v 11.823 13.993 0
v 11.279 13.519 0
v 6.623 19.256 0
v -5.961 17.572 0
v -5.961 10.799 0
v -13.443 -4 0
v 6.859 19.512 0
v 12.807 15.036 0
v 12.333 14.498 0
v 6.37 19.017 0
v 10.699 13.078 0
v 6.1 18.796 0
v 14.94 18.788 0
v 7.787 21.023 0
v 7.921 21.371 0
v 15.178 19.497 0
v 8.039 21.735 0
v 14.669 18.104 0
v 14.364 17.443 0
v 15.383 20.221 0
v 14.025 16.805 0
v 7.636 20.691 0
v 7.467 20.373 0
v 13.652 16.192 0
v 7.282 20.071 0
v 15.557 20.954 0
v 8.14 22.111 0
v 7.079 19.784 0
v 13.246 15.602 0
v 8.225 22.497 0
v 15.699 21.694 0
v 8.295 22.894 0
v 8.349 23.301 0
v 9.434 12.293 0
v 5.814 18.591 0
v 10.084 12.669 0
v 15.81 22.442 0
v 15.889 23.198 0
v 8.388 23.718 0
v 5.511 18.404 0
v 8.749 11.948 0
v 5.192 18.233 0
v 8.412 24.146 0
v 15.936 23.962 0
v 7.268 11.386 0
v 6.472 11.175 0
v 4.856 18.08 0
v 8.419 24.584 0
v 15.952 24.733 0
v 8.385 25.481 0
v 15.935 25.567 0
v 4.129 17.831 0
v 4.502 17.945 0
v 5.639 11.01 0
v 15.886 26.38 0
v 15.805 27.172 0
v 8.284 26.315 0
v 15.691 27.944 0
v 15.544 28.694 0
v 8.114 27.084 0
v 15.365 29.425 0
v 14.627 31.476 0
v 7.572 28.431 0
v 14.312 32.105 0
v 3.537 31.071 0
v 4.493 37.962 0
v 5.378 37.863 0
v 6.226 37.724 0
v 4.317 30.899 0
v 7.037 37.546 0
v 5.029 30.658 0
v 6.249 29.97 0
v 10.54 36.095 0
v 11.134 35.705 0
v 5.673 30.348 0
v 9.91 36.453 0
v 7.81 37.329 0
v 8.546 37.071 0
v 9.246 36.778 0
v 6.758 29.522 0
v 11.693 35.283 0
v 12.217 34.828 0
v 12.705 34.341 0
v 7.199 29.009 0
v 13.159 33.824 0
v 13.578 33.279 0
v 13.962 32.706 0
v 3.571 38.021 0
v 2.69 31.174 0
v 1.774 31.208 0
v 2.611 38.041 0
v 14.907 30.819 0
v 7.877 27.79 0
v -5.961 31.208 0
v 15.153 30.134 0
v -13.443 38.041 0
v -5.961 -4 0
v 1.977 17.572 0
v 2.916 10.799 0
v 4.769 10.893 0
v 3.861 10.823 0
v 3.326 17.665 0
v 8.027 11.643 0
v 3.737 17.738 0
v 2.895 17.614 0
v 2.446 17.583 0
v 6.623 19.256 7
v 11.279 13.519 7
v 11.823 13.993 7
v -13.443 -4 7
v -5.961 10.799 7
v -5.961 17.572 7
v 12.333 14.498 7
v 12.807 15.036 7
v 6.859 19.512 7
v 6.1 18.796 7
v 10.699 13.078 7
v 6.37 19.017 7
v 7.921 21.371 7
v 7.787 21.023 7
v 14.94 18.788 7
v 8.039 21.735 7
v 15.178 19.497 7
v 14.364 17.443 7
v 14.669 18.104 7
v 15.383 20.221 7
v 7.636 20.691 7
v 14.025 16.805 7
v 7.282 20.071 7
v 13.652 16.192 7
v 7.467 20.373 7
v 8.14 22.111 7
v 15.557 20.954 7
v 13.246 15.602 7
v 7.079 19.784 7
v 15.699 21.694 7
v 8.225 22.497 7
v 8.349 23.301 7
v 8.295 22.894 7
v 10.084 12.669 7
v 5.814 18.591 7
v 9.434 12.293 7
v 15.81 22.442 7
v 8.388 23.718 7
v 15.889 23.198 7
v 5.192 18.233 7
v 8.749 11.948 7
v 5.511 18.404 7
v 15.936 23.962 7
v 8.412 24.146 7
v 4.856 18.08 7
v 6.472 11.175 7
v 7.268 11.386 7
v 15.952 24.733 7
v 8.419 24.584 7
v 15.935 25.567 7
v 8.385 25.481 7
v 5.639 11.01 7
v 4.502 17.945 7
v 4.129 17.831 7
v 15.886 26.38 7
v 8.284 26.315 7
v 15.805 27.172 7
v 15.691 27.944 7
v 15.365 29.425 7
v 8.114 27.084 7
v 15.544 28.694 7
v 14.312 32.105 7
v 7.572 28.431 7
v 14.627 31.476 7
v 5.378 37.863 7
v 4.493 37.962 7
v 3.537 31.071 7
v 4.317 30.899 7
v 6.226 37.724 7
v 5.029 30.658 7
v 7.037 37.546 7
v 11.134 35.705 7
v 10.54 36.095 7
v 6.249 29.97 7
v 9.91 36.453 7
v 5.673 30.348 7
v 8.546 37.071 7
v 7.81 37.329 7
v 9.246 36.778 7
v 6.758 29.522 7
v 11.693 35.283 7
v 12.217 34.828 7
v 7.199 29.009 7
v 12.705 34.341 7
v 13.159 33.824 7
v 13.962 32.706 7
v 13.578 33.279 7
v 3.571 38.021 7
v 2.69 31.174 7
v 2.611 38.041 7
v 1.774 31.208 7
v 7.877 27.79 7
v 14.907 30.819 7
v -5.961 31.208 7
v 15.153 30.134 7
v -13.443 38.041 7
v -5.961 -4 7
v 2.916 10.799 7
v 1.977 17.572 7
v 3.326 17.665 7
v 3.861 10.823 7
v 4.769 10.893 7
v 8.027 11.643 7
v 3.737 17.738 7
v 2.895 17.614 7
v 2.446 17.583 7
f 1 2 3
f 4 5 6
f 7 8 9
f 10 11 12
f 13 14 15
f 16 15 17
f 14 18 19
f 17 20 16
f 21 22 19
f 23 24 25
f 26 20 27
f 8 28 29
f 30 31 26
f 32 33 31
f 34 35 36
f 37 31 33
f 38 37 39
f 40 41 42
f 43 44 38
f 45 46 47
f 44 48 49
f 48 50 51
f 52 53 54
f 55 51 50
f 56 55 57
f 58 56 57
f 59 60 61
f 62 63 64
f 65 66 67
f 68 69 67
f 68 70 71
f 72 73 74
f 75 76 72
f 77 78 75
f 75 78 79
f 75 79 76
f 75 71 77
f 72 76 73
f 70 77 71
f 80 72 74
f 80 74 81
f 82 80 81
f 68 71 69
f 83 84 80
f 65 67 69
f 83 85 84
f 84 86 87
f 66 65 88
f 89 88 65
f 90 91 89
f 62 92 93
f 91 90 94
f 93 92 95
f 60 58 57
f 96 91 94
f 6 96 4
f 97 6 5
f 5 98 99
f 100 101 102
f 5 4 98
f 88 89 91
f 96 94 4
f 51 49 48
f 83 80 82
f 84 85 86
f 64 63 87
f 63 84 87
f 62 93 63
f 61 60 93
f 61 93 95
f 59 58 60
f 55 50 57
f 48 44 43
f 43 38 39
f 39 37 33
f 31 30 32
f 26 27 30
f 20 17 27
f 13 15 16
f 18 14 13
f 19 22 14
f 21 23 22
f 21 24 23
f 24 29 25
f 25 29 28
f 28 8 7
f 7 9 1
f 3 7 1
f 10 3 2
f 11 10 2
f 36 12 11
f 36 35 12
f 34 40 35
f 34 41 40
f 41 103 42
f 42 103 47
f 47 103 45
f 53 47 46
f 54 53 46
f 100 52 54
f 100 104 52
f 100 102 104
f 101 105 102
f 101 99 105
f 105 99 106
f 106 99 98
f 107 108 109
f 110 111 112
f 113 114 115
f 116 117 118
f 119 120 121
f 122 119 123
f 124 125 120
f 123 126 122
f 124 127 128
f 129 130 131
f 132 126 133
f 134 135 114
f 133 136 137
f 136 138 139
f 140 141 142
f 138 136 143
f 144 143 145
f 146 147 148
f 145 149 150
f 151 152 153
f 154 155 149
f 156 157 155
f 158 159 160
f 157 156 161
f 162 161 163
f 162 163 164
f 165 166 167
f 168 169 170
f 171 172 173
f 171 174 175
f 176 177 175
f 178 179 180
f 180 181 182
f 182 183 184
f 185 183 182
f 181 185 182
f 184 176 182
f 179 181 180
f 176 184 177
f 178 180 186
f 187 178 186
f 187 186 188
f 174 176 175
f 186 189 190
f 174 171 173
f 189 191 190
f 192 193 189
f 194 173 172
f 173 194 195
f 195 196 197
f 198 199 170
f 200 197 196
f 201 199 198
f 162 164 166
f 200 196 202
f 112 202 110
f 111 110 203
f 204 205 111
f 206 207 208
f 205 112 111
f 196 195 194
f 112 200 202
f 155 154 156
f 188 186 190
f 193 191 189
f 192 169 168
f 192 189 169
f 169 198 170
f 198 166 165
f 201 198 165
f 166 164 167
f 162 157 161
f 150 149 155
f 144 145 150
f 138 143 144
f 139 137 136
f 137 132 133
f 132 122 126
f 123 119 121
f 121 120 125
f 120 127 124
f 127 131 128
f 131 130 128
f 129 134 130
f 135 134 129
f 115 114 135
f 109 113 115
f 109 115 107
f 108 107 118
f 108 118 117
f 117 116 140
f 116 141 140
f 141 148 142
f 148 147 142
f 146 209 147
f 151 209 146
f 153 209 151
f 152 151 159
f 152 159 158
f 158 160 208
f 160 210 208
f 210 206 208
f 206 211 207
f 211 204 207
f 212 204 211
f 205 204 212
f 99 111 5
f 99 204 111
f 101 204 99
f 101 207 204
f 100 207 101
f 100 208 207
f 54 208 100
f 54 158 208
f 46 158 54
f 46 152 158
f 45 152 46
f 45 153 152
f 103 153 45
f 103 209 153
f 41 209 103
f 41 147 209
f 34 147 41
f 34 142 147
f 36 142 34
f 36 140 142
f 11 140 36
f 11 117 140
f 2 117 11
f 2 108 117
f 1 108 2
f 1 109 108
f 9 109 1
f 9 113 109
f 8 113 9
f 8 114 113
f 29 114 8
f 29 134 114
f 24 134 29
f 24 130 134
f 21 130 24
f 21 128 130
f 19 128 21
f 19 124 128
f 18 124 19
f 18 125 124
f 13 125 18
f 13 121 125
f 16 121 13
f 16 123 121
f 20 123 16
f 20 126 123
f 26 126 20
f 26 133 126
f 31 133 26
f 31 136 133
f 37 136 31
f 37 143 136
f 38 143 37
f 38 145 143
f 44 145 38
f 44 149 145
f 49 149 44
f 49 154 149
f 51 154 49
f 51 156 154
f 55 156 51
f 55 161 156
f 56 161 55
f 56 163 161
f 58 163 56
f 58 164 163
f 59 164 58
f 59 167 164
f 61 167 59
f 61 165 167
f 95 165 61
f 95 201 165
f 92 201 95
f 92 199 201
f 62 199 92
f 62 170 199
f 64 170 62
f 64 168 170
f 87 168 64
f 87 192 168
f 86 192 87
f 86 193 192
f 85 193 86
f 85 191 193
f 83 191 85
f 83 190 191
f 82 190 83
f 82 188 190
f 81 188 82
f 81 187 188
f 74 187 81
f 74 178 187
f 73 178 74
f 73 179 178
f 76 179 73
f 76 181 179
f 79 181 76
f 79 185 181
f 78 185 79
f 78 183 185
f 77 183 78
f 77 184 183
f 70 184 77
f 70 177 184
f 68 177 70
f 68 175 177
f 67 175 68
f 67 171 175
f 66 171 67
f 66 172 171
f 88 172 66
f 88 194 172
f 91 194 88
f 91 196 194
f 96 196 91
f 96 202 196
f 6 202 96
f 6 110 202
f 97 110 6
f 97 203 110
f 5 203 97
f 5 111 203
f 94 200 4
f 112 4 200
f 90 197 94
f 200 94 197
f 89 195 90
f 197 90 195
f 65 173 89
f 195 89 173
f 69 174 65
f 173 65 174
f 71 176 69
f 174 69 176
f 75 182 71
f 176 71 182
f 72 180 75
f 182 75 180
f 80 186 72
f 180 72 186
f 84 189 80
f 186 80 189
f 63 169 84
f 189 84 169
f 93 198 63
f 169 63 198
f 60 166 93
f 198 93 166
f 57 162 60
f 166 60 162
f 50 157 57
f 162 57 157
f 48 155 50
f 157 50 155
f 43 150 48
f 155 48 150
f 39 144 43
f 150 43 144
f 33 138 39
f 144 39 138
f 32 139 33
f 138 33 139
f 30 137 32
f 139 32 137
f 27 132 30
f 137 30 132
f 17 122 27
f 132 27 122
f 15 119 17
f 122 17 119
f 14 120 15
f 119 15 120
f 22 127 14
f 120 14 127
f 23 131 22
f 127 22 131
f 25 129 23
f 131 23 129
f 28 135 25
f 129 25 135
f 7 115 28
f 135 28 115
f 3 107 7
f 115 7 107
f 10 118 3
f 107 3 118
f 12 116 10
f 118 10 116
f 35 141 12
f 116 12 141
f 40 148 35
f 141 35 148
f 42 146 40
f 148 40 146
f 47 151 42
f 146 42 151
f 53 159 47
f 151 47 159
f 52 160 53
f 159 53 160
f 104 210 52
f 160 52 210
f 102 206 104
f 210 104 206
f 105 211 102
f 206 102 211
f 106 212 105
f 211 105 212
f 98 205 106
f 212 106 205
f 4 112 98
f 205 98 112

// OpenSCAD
// file: glyph.scad
// glyph — the shared geometry of every letter in the set. Defines named geometry
// only, so it renders nothing on its own; each letter part includes it and calls
// letter(). Every dimension lives in ../../lib/common.scad.
//
// A LETTER IS NOTHING BUT A LETTER. No plinth, no tongue, no tab — it is the
// bare glyph, and it attaches by standing in the deck groove and resting on the
// groove's floor. Anything else on it would be a distraction on a learning toy.
//
// It is a flat plate of one thickness, printed face-down: no overhang anywhere,
// no supports, and the face on the bed comes out smoothest.
//
// TWO TRAPS WITH text():
//
//  * A missing font FALLS BACK SILENTLY — no warning, no error, just different
//    letters. "Liberation Sans" was the first choice here because OpenSCAD
//    bundles it; on macOS the bundled faces are not registered with fontconfig,
//    so it rendered the fallback face instead and nothing said so. To check a
//    font resolved, render a string with it and with a deliberately bogus name
//    and compare bounding boxes: identical means it fell back.
//  * `size` is not the cap height in general. For Helvetica Bold they coincide
//    (size 44 -> 44.0 mm cap), which is why letter_size reads as a height.
//    Change the font and re-measure.

include <../../lib/common.scad>

// The letter's outline, upright in the XY plane, ready to be extruded along Z
// (which is the letter's thickness, and the print's build axis).
//
//   y = 0   is the deck surface
//   y < 0   is the part standing down inside the groove. It reaches letter_bury,
//           which is where the tapered groove closes to letter_t — NOT the
//           groove's floor. The letter wedges; it never bottoms out.
module glyph_2d(ch) {
    intersection() {
        translate([0, -letter_bury])
            scale([letter_condense, 1])
                text(ch, size = letter_size, font = letter_font,
                     halign = "center", valign = "baseline");
        // Trimmed flat at the baseline. Round letters (O, C, G, S) overshoot the
        // baseline by design, and a letter standing on a convex curve rocks —
        // there is nothing to stop it leaning. The trim costs nothing visible
        // and gives every letter a flat foot on the groove floor.
        translate([-200, -letter_bury]) square([400, 400]);
    }
}

// One letter, in its print orientation: lying on its face, thickness up Z.
module letter(ch) {
    linear_extrude(letter_t) glyph_2d(ch);
}

// Where that letter sits once it is dropped into a chassis, for fit checks.
module letter_fitted(ch) {
    translate([0, letter_t/2, body_top]) rotate([90, 0, 0]) letter(ch);
}
// main file
// letter P — one part. See glyph.scad for the geometry and lib/common.scad for
// the dimensions. Prints lying on its face, exactly as exported: no supports.

include <glyph.scad>

letter("P");
